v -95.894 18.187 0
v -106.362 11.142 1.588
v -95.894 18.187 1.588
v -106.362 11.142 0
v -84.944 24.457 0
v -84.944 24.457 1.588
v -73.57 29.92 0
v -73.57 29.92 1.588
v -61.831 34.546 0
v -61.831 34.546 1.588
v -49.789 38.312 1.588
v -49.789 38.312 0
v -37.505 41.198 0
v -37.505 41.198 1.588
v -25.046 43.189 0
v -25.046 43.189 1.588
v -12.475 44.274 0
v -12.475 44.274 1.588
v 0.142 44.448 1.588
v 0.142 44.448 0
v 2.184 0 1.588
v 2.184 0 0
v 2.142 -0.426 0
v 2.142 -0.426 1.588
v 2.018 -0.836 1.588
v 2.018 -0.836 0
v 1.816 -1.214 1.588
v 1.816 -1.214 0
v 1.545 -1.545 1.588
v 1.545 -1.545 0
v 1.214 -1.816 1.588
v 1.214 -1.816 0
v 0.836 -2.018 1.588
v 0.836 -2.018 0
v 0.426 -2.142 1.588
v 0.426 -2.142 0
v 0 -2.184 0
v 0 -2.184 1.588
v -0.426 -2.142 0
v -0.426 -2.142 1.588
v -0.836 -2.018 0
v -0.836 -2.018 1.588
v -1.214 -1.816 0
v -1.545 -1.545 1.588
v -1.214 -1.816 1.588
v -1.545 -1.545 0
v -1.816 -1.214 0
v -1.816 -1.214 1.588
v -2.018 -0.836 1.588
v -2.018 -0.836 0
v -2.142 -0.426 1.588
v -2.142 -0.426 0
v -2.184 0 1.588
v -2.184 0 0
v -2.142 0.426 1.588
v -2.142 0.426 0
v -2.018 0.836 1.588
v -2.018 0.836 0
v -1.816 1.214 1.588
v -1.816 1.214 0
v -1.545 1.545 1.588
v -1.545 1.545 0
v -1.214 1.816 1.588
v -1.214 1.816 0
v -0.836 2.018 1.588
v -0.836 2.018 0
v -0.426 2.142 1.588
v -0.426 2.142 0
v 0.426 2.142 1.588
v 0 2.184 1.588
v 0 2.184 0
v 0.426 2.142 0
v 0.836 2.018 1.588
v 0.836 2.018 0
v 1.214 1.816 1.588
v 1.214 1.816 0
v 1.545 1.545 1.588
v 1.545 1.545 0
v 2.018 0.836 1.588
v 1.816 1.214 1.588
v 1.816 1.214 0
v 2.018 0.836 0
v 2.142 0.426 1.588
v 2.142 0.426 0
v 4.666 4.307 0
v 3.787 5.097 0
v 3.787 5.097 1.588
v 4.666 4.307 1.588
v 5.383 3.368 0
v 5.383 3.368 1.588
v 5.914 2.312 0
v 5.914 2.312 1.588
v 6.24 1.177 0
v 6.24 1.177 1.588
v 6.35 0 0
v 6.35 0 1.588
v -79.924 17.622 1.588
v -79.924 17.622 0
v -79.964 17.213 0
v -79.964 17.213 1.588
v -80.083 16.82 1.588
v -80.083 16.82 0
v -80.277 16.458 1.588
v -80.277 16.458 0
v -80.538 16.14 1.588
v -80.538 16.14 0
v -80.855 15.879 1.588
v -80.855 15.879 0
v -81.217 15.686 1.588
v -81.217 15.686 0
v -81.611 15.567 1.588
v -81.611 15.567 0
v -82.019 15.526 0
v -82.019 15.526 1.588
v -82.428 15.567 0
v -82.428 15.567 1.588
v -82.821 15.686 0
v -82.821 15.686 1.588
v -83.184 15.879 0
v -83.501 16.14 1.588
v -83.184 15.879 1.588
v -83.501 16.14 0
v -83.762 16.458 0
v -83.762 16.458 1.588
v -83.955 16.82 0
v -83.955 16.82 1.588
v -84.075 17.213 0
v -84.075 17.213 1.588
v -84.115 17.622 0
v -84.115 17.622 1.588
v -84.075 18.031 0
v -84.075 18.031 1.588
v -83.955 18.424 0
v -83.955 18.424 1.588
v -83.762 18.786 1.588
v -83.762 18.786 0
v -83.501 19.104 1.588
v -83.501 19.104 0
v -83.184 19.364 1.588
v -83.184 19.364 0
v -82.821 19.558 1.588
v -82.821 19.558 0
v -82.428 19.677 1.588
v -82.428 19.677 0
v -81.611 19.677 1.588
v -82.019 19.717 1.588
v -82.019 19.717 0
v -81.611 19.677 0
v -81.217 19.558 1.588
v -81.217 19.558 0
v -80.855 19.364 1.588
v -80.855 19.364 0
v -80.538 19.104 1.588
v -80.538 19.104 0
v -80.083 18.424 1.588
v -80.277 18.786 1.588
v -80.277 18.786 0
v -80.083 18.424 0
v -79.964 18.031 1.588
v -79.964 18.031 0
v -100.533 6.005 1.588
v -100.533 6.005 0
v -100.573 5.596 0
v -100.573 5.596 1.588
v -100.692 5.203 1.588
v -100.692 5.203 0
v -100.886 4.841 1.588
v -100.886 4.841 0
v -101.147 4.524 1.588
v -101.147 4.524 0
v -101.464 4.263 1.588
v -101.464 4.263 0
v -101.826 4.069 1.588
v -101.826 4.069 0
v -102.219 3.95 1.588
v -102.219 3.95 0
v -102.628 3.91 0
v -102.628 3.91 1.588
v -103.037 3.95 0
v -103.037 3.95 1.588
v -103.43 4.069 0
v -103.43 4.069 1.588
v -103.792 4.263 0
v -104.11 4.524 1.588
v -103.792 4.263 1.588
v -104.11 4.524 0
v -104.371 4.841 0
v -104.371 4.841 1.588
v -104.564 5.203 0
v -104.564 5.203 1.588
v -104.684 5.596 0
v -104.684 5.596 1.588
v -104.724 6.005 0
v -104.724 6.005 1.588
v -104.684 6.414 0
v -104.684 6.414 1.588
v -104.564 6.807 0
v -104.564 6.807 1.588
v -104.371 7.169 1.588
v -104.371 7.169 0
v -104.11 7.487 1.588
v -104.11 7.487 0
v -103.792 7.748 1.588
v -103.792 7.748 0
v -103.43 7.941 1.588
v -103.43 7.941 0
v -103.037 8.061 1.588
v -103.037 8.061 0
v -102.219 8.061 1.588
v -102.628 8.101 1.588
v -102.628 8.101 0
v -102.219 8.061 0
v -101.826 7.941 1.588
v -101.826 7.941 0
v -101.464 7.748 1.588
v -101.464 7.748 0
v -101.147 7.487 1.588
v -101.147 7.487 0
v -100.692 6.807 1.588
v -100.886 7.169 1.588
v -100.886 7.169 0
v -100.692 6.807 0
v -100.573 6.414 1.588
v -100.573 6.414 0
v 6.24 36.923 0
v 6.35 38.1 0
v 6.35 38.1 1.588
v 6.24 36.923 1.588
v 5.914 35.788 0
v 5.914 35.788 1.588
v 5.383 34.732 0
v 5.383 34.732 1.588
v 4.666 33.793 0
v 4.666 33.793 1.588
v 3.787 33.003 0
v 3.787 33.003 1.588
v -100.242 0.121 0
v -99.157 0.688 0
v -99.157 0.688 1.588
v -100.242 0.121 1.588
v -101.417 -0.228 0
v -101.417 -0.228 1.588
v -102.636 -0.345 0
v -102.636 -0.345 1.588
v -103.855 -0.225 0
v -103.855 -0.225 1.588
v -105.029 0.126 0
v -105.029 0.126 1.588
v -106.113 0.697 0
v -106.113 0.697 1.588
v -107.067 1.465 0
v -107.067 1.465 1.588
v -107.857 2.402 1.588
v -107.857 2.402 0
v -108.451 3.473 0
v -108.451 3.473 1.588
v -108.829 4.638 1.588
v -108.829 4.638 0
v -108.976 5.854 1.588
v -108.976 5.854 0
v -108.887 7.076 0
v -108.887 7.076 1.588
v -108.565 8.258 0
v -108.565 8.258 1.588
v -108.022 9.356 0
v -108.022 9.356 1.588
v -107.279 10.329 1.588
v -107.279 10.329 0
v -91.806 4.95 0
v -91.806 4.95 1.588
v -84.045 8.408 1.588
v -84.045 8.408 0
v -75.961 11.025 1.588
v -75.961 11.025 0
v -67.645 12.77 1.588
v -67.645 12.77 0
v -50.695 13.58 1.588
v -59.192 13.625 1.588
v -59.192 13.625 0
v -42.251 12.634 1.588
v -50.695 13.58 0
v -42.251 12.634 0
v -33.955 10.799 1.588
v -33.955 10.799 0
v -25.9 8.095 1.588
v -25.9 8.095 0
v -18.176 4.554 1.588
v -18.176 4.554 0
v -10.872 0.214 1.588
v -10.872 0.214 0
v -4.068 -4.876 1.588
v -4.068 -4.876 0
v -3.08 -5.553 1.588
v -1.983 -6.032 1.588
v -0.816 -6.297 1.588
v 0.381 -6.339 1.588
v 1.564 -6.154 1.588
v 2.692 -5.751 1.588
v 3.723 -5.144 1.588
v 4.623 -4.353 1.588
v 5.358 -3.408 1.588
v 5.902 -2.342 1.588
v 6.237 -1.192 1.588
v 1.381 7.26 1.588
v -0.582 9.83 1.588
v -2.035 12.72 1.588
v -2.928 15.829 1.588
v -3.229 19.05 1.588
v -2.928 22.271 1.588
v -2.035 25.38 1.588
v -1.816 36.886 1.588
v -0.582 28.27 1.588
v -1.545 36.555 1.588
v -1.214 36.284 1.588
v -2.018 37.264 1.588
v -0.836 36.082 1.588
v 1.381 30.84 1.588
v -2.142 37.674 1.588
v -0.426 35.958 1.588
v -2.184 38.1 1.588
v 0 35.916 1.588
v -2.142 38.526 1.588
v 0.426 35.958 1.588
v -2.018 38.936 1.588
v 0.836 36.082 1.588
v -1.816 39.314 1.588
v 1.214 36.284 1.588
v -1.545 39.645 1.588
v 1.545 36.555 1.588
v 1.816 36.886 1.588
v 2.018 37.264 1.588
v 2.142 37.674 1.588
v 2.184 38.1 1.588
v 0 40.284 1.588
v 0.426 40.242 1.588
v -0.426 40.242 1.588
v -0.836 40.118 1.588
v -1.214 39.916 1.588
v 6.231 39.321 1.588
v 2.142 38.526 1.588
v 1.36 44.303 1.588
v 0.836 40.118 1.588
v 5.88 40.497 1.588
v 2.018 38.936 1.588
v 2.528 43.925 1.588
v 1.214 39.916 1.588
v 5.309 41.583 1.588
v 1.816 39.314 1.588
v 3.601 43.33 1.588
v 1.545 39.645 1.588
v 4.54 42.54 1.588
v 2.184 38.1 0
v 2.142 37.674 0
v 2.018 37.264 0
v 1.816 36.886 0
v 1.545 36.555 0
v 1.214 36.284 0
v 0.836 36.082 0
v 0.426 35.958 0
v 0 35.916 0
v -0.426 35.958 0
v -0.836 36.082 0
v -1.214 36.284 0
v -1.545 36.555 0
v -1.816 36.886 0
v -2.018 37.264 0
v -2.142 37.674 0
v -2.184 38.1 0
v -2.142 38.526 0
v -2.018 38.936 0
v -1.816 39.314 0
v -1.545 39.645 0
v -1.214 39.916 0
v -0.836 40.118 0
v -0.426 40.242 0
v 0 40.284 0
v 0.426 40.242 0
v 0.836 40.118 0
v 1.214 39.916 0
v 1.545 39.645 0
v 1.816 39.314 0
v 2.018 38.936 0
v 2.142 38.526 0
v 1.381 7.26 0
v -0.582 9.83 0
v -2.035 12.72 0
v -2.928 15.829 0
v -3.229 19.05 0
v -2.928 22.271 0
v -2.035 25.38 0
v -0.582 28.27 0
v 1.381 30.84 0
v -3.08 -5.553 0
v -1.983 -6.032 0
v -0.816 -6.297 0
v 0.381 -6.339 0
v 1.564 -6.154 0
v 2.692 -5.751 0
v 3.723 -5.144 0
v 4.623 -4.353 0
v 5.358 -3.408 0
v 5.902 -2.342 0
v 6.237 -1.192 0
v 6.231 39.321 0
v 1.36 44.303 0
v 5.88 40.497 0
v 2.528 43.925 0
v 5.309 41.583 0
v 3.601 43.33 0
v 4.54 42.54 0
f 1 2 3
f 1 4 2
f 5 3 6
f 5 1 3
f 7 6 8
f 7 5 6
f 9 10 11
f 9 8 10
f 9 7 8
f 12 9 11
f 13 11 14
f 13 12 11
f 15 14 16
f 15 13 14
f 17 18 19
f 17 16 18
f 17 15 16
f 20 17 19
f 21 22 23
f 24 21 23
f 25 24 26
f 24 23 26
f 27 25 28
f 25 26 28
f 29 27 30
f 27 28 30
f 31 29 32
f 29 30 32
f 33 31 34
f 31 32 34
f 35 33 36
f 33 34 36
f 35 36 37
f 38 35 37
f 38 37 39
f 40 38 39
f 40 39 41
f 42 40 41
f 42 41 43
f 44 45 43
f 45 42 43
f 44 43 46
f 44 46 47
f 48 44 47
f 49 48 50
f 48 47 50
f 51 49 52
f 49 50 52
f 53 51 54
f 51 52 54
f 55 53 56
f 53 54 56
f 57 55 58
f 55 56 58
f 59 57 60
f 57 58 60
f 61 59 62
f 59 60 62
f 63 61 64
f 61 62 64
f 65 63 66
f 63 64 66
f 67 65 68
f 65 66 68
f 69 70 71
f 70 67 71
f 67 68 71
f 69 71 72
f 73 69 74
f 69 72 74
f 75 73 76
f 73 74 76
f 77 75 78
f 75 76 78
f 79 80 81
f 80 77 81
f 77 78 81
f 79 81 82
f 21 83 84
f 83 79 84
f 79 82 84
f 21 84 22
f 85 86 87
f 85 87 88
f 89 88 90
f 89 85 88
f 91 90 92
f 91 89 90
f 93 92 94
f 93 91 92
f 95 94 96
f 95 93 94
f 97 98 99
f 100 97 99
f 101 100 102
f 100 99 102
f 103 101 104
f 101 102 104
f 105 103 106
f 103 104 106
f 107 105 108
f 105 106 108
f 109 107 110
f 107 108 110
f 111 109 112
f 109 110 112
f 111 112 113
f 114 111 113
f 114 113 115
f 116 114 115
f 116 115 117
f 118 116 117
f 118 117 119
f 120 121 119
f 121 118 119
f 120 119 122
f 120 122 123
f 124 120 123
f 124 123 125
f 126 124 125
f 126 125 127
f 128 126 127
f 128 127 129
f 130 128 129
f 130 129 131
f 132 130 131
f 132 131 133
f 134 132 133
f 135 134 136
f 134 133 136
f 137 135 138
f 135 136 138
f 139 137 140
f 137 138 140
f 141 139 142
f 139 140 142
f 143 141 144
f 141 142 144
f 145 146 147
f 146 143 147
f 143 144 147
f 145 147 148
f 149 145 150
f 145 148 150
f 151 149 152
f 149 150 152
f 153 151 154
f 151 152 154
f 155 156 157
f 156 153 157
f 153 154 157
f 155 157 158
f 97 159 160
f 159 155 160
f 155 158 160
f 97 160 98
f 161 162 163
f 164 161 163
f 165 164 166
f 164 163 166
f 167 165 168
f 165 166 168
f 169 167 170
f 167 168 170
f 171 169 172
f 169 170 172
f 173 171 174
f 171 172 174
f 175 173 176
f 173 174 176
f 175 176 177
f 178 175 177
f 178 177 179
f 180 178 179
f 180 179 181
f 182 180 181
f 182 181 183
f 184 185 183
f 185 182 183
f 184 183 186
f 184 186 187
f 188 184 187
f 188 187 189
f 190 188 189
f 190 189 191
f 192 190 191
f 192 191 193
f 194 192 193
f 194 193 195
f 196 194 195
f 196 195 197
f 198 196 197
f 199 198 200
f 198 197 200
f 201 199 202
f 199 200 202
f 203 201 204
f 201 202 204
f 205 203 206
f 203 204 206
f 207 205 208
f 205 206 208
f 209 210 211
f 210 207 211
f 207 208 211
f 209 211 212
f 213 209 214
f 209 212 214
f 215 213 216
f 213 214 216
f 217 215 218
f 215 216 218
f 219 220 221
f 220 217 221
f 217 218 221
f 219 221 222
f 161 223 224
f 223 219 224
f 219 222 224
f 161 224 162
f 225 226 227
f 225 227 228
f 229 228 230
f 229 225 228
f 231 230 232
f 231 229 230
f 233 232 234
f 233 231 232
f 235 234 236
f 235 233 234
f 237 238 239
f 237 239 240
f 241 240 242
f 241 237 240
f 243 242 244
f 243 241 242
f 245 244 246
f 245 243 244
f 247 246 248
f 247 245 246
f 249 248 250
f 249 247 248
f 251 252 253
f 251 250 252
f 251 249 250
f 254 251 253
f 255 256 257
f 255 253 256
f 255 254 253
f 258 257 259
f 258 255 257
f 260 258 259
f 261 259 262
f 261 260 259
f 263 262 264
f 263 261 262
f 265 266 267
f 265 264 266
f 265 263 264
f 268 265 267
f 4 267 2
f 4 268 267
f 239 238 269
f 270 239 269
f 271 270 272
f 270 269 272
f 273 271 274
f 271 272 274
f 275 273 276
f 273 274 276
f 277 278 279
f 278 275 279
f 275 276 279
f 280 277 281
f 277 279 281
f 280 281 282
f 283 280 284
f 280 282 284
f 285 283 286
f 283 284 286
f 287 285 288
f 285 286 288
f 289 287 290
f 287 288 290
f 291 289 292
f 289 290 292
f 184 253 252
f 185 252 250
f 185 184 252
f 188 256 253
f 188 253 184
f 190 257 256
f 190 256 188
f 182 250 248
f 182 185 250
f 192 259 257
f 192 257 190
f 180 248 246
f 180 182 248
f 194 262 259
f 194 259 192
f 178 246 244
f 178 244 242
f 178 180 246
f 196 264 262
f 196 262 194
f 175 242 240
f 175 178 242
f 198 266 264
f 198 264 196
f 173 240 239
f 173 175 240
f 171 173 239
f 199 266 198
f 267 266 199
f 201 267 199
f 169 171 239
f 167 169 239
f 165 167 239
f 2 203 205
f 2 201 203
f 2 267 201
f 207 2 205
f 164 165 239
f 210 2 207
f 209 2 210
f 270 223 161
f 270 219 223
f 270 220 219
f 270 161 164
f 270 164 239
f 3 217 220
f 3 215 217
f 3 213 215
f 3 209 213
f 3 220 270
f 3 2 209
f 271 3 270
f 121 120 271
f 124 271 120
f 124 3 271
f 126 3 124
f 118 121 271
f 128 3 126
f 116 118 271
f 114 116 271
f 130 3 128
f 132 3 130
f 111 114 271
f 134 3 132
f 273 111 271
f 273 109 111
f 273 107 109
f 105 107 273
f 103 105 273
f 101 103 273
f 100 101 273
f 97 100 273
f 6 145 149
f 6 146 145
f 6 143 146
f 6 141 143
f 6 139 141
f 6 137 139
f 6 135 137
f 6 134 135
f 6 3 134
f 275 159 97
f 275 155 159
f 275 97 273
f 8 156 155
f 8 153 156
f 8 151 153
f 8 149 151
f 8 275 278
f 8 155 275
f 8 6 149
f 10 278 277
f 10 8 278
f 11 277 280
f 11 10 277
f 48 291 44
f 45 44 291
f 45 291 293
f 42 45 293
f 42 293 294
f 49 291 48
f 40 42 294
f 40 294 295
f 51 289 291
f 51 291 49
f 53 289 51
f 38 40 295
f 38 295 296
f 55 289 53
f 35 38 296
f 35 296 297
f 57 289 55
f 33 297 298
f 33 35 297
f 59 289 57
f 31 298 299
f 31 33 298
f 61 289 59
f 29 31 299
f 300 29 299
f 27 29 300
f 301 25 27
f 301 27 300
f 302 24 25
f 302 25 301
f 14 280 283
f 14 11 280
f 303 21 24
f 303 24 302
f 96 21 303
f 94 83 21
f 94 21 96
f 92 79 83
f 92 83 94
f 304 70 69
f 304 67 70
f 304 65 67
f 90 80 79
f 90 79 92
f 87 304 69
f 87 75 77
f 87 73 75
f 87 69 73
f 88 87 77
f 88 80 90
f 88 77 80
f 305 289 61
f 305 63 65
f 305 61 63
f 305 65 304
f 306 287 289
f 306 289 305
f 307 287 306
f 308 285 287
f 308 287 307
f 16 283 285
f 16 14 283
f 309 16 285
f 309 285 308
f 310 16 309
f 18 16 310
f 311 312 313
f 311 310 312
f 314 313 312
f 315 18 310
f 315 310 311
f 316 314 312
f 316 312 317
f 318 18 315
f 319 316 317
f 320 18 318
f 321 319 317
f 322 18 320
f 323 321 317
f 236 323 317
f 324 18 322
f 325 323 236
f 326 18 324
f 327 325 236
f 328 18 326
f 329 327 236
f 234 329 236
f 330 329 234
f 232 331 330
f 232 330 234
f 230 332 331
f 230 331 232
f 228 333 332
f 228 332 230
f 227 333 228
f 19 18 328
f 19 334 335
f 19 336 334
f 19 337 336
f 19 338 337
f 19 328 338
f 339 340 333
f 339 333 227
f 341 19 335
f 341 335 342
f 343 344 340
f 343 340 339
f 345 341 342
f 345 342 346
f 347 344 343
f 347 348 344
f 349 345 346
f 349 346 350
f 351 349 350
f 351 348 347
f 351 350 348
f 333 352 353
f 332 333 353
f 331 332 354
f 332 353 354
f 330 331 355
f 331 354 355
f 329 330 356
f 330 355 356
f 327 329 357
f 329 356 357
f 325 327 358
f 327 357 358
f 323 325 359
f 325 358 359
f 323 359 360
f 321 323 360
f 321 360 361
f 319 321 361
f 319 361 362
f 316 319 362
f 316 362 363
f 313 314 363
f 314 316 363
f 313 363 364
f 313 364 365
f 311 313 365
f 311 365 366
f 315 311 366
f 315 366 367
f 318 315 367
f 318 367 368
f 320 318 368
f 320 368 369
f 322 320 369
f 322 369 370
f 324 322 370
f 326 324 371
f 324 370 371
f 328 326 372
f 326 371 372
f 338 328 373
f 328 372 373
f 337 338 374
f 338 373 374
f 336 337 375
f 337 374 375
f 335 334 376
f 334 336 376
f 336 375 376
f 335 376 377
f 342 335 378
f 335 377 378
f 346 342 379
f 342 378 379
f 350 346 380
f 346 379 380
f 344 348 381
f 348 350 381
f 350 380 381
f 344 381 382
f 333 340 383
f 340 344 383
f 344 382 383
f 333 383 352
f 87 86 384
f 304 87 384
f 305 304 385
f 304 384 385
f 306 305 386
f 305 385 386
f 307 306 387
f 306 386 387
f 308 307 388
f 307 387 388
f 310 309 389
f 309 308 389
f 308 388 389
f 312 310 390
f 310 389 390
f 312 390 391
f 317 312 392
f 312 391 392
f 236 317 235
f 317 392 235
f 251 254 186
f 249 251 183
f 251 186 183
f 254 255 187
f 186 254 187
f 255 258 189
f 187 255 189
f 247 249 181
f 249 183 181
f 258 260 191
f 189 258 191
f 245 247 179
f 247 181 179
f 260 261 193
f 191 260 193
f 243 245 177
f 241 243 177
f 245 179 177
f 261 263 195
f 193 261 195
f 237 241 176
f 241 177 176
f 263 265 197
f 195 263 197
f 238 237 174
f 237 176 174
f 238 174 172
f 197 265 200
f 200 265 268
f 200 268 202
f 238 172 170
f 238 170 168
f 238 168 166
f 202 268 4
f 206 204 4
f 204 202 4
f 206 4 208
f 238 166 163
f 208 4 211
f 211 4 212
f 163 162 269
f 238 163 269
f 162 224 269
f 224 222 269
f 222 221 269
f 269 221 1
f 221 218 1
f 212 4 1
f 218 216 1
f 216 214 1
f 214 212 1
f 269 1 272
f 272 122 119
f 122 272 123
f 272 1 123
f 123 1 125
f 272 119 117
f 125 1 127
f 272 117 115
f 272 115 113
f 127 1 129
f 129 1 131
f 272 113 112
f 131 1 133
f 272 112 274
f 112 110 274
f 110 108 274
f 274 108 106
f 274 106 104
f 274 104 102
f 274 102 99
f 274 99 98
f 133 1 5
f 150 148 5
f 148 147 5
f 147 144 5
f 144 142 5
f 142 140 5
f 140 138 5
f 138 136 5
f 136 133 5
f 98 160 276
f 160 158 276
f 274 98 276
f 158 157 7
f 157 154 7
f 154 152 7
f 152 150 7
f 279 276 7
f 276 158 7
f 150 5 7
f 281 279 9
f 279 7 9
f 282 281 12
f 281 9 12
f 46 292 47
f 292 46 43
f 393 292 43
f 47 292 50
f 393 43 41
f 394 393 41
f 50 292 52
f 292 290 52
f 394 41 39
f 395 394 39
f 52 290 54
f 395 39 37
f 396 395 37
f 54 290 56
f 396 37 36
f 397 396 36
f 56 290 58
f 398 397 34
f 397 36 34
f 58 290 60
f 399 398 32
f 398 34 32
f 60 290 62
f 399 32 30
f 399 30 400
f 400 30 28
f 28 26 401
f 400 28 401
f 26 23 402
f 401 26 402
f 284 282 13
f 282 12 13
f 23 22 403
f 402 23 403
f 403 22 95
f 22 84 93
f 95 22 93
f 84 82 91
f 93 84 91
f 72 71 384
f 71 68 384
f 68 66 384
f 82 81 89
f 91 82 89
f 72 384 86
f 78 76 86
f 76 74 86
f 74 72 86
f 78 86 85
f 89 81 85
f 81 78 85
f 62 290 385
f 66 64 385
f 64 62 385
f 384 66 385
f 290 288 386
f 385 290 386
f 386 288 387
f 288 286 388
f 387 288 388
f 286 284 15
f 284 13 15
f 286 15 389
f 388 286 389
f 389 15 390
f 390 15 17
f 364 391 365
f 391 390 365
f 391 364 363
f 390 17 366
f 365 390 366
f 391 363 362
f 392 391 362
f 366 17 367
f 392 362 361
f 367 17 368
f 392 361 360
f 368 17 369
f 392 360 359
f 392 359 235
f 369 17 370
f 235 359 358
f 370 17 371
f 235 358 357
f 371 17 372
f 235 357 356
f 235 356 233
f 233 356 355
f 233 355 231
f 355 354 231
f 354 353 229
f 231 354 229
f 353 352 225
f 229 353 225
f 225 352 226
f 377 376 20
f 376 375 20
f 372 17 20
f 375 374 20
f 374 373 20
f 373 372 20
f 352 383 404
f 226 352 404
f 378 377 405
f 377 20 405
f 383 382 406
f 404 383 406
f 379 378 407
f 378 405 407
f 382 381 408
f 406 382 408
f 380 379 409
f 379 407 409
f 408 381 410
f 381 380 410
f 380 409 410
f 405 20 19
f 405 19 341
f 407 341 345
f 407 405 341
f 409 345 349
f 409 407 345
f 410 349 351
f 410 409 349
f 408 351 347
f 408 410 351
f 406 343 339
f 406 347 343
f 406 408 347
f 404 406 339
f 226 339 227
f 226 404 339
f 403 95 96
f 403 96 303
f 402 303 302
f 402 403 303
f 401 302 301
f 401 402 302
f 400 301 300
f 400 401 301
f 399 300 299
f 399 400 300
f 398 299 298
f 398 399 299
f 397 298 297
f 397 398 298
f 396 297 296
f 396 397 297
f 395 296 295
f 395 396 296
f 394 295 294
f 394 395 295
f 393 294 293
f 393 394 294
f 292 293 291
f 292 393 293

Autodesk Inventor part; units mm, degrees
ref_plane "YZ Plane" through (0, 0, 0) normal (1, 0, 0) x (0, 1, 0)
ref_plane "XZ Plane" through (0, 0, 0) normal (0, 1, 0) x (-1, 0, 0)
ref_plane "XY Plane" through (0, 0, 0) normal (0, 0, 1) x (1, 0, 0)
sketch "Block1" plane through (0, 0, 0) normal (0, 0, 1) x (1, 0, 0)
  circle A0 centre (47.0944, 34.7657) radius 2.1844
  circle A1 centre (-55.5339, 40.771) radius 2.0955
  arc A2 (-59.2675, 45.9074) -> (-52.0623, 35.454) centre (-55.5339, 40.771) ccw
  arc A3 (43.0264, 29.8899) -> (53.4444, 34.7657) centre (47.0944, 34.7657) ccw
  arc A4 (43.0264, 29.8899) -> (-52.0623, 35.454) centre (-8.279, -31.6038) ccw
  circle A5 centre (47.0944, 72.8657) radius 2.1844
  arc A6 (53.4444, 72.8657) -> (47.2364, 79.2141) centre (47.0944, 72.8657) ccw
  arc A7 (47.2364, 79.2141) -> (-59.2675, 45.9074) centre (43.3348, -95.2454) ccw
  circle A8 centre (-34.925, 52.3875) radius 2.0955
  point P0 (37.587, 35.3505)
  dimension "d2" = 12.7
  dimension "d3" = 12.7
  dimension "d4" = 12.7
  dimension "d9" = 4.191
sketch "Sketch1" plane through (0, 0, 0) normal (0, 0, 1) x (1, 0, 0)
  arc A0 (3.787, 33.0028) -> (0.142, 44.4484) centre (0, 38.1) ccw
  arc A1 (-4.068, -4.8758) -> (3.787, 5.0972) centre (0, 0) ccw
  arc A2 (3.787, 33.0028) -> (3.787, 5.0972) centre (14.1532, 19.05) ccw
  circle A3 centre (0, 0) radius 2.1844
  circle A4 centre (-102.6283, 6.0053) radius 2.0955
  arc A5 (-106.3619, 11.1417) -> (-99.1567, 0.6883) centre (-102.6283, 6.0053) ccw
  arc A6 (-4.068, -4.8758) -> (6.35, 0) centre (0, 0) ccw
  arc A7 (-4.068, -4.8758) -> (-99.1567, 0.6883) centre (-55.3735, -66.3695) ccw
  circle A8 centre (0, 38.1) radius 2.1844
  arc A9 (6.35, 38.1) -> (0.142, 44.4484) centre (0, 38.1) ccw
  arc A10 (0.142, 44.4484) -> (-106.3619, 11.1417) centre (-3.7596, -130.0112) ccw
  circle A11 centre (-82.0194, 17.6218) radius 2.0955
  point P0 (6.35, 0)
  point P1 (6.35, 38.1)
extrude "Extrusion1" add sketch "Sketch1" along normal blind 1.5875
equation "\"BendRadius\" = Thickness"
equation "\"BendReliefWidth\" = Thickness"
equation "\"BendReliefDepth\" = 0.5 * Thickness"
equation "\"CornerReliefSize\" = 4 * Thickness"
equation "\"MinimumRemnant\" = 2 * Thickness"
equation "\"TransitionRadius\" = BendRadius"
equation "\"JacobiRadiusSize\" = BendRadius"
equation "\"GapSize\" = Thickness"
equation "\"Thickness\" = 1.5875"
properties part number "triball_jig" material "Acetal Resin, White"
